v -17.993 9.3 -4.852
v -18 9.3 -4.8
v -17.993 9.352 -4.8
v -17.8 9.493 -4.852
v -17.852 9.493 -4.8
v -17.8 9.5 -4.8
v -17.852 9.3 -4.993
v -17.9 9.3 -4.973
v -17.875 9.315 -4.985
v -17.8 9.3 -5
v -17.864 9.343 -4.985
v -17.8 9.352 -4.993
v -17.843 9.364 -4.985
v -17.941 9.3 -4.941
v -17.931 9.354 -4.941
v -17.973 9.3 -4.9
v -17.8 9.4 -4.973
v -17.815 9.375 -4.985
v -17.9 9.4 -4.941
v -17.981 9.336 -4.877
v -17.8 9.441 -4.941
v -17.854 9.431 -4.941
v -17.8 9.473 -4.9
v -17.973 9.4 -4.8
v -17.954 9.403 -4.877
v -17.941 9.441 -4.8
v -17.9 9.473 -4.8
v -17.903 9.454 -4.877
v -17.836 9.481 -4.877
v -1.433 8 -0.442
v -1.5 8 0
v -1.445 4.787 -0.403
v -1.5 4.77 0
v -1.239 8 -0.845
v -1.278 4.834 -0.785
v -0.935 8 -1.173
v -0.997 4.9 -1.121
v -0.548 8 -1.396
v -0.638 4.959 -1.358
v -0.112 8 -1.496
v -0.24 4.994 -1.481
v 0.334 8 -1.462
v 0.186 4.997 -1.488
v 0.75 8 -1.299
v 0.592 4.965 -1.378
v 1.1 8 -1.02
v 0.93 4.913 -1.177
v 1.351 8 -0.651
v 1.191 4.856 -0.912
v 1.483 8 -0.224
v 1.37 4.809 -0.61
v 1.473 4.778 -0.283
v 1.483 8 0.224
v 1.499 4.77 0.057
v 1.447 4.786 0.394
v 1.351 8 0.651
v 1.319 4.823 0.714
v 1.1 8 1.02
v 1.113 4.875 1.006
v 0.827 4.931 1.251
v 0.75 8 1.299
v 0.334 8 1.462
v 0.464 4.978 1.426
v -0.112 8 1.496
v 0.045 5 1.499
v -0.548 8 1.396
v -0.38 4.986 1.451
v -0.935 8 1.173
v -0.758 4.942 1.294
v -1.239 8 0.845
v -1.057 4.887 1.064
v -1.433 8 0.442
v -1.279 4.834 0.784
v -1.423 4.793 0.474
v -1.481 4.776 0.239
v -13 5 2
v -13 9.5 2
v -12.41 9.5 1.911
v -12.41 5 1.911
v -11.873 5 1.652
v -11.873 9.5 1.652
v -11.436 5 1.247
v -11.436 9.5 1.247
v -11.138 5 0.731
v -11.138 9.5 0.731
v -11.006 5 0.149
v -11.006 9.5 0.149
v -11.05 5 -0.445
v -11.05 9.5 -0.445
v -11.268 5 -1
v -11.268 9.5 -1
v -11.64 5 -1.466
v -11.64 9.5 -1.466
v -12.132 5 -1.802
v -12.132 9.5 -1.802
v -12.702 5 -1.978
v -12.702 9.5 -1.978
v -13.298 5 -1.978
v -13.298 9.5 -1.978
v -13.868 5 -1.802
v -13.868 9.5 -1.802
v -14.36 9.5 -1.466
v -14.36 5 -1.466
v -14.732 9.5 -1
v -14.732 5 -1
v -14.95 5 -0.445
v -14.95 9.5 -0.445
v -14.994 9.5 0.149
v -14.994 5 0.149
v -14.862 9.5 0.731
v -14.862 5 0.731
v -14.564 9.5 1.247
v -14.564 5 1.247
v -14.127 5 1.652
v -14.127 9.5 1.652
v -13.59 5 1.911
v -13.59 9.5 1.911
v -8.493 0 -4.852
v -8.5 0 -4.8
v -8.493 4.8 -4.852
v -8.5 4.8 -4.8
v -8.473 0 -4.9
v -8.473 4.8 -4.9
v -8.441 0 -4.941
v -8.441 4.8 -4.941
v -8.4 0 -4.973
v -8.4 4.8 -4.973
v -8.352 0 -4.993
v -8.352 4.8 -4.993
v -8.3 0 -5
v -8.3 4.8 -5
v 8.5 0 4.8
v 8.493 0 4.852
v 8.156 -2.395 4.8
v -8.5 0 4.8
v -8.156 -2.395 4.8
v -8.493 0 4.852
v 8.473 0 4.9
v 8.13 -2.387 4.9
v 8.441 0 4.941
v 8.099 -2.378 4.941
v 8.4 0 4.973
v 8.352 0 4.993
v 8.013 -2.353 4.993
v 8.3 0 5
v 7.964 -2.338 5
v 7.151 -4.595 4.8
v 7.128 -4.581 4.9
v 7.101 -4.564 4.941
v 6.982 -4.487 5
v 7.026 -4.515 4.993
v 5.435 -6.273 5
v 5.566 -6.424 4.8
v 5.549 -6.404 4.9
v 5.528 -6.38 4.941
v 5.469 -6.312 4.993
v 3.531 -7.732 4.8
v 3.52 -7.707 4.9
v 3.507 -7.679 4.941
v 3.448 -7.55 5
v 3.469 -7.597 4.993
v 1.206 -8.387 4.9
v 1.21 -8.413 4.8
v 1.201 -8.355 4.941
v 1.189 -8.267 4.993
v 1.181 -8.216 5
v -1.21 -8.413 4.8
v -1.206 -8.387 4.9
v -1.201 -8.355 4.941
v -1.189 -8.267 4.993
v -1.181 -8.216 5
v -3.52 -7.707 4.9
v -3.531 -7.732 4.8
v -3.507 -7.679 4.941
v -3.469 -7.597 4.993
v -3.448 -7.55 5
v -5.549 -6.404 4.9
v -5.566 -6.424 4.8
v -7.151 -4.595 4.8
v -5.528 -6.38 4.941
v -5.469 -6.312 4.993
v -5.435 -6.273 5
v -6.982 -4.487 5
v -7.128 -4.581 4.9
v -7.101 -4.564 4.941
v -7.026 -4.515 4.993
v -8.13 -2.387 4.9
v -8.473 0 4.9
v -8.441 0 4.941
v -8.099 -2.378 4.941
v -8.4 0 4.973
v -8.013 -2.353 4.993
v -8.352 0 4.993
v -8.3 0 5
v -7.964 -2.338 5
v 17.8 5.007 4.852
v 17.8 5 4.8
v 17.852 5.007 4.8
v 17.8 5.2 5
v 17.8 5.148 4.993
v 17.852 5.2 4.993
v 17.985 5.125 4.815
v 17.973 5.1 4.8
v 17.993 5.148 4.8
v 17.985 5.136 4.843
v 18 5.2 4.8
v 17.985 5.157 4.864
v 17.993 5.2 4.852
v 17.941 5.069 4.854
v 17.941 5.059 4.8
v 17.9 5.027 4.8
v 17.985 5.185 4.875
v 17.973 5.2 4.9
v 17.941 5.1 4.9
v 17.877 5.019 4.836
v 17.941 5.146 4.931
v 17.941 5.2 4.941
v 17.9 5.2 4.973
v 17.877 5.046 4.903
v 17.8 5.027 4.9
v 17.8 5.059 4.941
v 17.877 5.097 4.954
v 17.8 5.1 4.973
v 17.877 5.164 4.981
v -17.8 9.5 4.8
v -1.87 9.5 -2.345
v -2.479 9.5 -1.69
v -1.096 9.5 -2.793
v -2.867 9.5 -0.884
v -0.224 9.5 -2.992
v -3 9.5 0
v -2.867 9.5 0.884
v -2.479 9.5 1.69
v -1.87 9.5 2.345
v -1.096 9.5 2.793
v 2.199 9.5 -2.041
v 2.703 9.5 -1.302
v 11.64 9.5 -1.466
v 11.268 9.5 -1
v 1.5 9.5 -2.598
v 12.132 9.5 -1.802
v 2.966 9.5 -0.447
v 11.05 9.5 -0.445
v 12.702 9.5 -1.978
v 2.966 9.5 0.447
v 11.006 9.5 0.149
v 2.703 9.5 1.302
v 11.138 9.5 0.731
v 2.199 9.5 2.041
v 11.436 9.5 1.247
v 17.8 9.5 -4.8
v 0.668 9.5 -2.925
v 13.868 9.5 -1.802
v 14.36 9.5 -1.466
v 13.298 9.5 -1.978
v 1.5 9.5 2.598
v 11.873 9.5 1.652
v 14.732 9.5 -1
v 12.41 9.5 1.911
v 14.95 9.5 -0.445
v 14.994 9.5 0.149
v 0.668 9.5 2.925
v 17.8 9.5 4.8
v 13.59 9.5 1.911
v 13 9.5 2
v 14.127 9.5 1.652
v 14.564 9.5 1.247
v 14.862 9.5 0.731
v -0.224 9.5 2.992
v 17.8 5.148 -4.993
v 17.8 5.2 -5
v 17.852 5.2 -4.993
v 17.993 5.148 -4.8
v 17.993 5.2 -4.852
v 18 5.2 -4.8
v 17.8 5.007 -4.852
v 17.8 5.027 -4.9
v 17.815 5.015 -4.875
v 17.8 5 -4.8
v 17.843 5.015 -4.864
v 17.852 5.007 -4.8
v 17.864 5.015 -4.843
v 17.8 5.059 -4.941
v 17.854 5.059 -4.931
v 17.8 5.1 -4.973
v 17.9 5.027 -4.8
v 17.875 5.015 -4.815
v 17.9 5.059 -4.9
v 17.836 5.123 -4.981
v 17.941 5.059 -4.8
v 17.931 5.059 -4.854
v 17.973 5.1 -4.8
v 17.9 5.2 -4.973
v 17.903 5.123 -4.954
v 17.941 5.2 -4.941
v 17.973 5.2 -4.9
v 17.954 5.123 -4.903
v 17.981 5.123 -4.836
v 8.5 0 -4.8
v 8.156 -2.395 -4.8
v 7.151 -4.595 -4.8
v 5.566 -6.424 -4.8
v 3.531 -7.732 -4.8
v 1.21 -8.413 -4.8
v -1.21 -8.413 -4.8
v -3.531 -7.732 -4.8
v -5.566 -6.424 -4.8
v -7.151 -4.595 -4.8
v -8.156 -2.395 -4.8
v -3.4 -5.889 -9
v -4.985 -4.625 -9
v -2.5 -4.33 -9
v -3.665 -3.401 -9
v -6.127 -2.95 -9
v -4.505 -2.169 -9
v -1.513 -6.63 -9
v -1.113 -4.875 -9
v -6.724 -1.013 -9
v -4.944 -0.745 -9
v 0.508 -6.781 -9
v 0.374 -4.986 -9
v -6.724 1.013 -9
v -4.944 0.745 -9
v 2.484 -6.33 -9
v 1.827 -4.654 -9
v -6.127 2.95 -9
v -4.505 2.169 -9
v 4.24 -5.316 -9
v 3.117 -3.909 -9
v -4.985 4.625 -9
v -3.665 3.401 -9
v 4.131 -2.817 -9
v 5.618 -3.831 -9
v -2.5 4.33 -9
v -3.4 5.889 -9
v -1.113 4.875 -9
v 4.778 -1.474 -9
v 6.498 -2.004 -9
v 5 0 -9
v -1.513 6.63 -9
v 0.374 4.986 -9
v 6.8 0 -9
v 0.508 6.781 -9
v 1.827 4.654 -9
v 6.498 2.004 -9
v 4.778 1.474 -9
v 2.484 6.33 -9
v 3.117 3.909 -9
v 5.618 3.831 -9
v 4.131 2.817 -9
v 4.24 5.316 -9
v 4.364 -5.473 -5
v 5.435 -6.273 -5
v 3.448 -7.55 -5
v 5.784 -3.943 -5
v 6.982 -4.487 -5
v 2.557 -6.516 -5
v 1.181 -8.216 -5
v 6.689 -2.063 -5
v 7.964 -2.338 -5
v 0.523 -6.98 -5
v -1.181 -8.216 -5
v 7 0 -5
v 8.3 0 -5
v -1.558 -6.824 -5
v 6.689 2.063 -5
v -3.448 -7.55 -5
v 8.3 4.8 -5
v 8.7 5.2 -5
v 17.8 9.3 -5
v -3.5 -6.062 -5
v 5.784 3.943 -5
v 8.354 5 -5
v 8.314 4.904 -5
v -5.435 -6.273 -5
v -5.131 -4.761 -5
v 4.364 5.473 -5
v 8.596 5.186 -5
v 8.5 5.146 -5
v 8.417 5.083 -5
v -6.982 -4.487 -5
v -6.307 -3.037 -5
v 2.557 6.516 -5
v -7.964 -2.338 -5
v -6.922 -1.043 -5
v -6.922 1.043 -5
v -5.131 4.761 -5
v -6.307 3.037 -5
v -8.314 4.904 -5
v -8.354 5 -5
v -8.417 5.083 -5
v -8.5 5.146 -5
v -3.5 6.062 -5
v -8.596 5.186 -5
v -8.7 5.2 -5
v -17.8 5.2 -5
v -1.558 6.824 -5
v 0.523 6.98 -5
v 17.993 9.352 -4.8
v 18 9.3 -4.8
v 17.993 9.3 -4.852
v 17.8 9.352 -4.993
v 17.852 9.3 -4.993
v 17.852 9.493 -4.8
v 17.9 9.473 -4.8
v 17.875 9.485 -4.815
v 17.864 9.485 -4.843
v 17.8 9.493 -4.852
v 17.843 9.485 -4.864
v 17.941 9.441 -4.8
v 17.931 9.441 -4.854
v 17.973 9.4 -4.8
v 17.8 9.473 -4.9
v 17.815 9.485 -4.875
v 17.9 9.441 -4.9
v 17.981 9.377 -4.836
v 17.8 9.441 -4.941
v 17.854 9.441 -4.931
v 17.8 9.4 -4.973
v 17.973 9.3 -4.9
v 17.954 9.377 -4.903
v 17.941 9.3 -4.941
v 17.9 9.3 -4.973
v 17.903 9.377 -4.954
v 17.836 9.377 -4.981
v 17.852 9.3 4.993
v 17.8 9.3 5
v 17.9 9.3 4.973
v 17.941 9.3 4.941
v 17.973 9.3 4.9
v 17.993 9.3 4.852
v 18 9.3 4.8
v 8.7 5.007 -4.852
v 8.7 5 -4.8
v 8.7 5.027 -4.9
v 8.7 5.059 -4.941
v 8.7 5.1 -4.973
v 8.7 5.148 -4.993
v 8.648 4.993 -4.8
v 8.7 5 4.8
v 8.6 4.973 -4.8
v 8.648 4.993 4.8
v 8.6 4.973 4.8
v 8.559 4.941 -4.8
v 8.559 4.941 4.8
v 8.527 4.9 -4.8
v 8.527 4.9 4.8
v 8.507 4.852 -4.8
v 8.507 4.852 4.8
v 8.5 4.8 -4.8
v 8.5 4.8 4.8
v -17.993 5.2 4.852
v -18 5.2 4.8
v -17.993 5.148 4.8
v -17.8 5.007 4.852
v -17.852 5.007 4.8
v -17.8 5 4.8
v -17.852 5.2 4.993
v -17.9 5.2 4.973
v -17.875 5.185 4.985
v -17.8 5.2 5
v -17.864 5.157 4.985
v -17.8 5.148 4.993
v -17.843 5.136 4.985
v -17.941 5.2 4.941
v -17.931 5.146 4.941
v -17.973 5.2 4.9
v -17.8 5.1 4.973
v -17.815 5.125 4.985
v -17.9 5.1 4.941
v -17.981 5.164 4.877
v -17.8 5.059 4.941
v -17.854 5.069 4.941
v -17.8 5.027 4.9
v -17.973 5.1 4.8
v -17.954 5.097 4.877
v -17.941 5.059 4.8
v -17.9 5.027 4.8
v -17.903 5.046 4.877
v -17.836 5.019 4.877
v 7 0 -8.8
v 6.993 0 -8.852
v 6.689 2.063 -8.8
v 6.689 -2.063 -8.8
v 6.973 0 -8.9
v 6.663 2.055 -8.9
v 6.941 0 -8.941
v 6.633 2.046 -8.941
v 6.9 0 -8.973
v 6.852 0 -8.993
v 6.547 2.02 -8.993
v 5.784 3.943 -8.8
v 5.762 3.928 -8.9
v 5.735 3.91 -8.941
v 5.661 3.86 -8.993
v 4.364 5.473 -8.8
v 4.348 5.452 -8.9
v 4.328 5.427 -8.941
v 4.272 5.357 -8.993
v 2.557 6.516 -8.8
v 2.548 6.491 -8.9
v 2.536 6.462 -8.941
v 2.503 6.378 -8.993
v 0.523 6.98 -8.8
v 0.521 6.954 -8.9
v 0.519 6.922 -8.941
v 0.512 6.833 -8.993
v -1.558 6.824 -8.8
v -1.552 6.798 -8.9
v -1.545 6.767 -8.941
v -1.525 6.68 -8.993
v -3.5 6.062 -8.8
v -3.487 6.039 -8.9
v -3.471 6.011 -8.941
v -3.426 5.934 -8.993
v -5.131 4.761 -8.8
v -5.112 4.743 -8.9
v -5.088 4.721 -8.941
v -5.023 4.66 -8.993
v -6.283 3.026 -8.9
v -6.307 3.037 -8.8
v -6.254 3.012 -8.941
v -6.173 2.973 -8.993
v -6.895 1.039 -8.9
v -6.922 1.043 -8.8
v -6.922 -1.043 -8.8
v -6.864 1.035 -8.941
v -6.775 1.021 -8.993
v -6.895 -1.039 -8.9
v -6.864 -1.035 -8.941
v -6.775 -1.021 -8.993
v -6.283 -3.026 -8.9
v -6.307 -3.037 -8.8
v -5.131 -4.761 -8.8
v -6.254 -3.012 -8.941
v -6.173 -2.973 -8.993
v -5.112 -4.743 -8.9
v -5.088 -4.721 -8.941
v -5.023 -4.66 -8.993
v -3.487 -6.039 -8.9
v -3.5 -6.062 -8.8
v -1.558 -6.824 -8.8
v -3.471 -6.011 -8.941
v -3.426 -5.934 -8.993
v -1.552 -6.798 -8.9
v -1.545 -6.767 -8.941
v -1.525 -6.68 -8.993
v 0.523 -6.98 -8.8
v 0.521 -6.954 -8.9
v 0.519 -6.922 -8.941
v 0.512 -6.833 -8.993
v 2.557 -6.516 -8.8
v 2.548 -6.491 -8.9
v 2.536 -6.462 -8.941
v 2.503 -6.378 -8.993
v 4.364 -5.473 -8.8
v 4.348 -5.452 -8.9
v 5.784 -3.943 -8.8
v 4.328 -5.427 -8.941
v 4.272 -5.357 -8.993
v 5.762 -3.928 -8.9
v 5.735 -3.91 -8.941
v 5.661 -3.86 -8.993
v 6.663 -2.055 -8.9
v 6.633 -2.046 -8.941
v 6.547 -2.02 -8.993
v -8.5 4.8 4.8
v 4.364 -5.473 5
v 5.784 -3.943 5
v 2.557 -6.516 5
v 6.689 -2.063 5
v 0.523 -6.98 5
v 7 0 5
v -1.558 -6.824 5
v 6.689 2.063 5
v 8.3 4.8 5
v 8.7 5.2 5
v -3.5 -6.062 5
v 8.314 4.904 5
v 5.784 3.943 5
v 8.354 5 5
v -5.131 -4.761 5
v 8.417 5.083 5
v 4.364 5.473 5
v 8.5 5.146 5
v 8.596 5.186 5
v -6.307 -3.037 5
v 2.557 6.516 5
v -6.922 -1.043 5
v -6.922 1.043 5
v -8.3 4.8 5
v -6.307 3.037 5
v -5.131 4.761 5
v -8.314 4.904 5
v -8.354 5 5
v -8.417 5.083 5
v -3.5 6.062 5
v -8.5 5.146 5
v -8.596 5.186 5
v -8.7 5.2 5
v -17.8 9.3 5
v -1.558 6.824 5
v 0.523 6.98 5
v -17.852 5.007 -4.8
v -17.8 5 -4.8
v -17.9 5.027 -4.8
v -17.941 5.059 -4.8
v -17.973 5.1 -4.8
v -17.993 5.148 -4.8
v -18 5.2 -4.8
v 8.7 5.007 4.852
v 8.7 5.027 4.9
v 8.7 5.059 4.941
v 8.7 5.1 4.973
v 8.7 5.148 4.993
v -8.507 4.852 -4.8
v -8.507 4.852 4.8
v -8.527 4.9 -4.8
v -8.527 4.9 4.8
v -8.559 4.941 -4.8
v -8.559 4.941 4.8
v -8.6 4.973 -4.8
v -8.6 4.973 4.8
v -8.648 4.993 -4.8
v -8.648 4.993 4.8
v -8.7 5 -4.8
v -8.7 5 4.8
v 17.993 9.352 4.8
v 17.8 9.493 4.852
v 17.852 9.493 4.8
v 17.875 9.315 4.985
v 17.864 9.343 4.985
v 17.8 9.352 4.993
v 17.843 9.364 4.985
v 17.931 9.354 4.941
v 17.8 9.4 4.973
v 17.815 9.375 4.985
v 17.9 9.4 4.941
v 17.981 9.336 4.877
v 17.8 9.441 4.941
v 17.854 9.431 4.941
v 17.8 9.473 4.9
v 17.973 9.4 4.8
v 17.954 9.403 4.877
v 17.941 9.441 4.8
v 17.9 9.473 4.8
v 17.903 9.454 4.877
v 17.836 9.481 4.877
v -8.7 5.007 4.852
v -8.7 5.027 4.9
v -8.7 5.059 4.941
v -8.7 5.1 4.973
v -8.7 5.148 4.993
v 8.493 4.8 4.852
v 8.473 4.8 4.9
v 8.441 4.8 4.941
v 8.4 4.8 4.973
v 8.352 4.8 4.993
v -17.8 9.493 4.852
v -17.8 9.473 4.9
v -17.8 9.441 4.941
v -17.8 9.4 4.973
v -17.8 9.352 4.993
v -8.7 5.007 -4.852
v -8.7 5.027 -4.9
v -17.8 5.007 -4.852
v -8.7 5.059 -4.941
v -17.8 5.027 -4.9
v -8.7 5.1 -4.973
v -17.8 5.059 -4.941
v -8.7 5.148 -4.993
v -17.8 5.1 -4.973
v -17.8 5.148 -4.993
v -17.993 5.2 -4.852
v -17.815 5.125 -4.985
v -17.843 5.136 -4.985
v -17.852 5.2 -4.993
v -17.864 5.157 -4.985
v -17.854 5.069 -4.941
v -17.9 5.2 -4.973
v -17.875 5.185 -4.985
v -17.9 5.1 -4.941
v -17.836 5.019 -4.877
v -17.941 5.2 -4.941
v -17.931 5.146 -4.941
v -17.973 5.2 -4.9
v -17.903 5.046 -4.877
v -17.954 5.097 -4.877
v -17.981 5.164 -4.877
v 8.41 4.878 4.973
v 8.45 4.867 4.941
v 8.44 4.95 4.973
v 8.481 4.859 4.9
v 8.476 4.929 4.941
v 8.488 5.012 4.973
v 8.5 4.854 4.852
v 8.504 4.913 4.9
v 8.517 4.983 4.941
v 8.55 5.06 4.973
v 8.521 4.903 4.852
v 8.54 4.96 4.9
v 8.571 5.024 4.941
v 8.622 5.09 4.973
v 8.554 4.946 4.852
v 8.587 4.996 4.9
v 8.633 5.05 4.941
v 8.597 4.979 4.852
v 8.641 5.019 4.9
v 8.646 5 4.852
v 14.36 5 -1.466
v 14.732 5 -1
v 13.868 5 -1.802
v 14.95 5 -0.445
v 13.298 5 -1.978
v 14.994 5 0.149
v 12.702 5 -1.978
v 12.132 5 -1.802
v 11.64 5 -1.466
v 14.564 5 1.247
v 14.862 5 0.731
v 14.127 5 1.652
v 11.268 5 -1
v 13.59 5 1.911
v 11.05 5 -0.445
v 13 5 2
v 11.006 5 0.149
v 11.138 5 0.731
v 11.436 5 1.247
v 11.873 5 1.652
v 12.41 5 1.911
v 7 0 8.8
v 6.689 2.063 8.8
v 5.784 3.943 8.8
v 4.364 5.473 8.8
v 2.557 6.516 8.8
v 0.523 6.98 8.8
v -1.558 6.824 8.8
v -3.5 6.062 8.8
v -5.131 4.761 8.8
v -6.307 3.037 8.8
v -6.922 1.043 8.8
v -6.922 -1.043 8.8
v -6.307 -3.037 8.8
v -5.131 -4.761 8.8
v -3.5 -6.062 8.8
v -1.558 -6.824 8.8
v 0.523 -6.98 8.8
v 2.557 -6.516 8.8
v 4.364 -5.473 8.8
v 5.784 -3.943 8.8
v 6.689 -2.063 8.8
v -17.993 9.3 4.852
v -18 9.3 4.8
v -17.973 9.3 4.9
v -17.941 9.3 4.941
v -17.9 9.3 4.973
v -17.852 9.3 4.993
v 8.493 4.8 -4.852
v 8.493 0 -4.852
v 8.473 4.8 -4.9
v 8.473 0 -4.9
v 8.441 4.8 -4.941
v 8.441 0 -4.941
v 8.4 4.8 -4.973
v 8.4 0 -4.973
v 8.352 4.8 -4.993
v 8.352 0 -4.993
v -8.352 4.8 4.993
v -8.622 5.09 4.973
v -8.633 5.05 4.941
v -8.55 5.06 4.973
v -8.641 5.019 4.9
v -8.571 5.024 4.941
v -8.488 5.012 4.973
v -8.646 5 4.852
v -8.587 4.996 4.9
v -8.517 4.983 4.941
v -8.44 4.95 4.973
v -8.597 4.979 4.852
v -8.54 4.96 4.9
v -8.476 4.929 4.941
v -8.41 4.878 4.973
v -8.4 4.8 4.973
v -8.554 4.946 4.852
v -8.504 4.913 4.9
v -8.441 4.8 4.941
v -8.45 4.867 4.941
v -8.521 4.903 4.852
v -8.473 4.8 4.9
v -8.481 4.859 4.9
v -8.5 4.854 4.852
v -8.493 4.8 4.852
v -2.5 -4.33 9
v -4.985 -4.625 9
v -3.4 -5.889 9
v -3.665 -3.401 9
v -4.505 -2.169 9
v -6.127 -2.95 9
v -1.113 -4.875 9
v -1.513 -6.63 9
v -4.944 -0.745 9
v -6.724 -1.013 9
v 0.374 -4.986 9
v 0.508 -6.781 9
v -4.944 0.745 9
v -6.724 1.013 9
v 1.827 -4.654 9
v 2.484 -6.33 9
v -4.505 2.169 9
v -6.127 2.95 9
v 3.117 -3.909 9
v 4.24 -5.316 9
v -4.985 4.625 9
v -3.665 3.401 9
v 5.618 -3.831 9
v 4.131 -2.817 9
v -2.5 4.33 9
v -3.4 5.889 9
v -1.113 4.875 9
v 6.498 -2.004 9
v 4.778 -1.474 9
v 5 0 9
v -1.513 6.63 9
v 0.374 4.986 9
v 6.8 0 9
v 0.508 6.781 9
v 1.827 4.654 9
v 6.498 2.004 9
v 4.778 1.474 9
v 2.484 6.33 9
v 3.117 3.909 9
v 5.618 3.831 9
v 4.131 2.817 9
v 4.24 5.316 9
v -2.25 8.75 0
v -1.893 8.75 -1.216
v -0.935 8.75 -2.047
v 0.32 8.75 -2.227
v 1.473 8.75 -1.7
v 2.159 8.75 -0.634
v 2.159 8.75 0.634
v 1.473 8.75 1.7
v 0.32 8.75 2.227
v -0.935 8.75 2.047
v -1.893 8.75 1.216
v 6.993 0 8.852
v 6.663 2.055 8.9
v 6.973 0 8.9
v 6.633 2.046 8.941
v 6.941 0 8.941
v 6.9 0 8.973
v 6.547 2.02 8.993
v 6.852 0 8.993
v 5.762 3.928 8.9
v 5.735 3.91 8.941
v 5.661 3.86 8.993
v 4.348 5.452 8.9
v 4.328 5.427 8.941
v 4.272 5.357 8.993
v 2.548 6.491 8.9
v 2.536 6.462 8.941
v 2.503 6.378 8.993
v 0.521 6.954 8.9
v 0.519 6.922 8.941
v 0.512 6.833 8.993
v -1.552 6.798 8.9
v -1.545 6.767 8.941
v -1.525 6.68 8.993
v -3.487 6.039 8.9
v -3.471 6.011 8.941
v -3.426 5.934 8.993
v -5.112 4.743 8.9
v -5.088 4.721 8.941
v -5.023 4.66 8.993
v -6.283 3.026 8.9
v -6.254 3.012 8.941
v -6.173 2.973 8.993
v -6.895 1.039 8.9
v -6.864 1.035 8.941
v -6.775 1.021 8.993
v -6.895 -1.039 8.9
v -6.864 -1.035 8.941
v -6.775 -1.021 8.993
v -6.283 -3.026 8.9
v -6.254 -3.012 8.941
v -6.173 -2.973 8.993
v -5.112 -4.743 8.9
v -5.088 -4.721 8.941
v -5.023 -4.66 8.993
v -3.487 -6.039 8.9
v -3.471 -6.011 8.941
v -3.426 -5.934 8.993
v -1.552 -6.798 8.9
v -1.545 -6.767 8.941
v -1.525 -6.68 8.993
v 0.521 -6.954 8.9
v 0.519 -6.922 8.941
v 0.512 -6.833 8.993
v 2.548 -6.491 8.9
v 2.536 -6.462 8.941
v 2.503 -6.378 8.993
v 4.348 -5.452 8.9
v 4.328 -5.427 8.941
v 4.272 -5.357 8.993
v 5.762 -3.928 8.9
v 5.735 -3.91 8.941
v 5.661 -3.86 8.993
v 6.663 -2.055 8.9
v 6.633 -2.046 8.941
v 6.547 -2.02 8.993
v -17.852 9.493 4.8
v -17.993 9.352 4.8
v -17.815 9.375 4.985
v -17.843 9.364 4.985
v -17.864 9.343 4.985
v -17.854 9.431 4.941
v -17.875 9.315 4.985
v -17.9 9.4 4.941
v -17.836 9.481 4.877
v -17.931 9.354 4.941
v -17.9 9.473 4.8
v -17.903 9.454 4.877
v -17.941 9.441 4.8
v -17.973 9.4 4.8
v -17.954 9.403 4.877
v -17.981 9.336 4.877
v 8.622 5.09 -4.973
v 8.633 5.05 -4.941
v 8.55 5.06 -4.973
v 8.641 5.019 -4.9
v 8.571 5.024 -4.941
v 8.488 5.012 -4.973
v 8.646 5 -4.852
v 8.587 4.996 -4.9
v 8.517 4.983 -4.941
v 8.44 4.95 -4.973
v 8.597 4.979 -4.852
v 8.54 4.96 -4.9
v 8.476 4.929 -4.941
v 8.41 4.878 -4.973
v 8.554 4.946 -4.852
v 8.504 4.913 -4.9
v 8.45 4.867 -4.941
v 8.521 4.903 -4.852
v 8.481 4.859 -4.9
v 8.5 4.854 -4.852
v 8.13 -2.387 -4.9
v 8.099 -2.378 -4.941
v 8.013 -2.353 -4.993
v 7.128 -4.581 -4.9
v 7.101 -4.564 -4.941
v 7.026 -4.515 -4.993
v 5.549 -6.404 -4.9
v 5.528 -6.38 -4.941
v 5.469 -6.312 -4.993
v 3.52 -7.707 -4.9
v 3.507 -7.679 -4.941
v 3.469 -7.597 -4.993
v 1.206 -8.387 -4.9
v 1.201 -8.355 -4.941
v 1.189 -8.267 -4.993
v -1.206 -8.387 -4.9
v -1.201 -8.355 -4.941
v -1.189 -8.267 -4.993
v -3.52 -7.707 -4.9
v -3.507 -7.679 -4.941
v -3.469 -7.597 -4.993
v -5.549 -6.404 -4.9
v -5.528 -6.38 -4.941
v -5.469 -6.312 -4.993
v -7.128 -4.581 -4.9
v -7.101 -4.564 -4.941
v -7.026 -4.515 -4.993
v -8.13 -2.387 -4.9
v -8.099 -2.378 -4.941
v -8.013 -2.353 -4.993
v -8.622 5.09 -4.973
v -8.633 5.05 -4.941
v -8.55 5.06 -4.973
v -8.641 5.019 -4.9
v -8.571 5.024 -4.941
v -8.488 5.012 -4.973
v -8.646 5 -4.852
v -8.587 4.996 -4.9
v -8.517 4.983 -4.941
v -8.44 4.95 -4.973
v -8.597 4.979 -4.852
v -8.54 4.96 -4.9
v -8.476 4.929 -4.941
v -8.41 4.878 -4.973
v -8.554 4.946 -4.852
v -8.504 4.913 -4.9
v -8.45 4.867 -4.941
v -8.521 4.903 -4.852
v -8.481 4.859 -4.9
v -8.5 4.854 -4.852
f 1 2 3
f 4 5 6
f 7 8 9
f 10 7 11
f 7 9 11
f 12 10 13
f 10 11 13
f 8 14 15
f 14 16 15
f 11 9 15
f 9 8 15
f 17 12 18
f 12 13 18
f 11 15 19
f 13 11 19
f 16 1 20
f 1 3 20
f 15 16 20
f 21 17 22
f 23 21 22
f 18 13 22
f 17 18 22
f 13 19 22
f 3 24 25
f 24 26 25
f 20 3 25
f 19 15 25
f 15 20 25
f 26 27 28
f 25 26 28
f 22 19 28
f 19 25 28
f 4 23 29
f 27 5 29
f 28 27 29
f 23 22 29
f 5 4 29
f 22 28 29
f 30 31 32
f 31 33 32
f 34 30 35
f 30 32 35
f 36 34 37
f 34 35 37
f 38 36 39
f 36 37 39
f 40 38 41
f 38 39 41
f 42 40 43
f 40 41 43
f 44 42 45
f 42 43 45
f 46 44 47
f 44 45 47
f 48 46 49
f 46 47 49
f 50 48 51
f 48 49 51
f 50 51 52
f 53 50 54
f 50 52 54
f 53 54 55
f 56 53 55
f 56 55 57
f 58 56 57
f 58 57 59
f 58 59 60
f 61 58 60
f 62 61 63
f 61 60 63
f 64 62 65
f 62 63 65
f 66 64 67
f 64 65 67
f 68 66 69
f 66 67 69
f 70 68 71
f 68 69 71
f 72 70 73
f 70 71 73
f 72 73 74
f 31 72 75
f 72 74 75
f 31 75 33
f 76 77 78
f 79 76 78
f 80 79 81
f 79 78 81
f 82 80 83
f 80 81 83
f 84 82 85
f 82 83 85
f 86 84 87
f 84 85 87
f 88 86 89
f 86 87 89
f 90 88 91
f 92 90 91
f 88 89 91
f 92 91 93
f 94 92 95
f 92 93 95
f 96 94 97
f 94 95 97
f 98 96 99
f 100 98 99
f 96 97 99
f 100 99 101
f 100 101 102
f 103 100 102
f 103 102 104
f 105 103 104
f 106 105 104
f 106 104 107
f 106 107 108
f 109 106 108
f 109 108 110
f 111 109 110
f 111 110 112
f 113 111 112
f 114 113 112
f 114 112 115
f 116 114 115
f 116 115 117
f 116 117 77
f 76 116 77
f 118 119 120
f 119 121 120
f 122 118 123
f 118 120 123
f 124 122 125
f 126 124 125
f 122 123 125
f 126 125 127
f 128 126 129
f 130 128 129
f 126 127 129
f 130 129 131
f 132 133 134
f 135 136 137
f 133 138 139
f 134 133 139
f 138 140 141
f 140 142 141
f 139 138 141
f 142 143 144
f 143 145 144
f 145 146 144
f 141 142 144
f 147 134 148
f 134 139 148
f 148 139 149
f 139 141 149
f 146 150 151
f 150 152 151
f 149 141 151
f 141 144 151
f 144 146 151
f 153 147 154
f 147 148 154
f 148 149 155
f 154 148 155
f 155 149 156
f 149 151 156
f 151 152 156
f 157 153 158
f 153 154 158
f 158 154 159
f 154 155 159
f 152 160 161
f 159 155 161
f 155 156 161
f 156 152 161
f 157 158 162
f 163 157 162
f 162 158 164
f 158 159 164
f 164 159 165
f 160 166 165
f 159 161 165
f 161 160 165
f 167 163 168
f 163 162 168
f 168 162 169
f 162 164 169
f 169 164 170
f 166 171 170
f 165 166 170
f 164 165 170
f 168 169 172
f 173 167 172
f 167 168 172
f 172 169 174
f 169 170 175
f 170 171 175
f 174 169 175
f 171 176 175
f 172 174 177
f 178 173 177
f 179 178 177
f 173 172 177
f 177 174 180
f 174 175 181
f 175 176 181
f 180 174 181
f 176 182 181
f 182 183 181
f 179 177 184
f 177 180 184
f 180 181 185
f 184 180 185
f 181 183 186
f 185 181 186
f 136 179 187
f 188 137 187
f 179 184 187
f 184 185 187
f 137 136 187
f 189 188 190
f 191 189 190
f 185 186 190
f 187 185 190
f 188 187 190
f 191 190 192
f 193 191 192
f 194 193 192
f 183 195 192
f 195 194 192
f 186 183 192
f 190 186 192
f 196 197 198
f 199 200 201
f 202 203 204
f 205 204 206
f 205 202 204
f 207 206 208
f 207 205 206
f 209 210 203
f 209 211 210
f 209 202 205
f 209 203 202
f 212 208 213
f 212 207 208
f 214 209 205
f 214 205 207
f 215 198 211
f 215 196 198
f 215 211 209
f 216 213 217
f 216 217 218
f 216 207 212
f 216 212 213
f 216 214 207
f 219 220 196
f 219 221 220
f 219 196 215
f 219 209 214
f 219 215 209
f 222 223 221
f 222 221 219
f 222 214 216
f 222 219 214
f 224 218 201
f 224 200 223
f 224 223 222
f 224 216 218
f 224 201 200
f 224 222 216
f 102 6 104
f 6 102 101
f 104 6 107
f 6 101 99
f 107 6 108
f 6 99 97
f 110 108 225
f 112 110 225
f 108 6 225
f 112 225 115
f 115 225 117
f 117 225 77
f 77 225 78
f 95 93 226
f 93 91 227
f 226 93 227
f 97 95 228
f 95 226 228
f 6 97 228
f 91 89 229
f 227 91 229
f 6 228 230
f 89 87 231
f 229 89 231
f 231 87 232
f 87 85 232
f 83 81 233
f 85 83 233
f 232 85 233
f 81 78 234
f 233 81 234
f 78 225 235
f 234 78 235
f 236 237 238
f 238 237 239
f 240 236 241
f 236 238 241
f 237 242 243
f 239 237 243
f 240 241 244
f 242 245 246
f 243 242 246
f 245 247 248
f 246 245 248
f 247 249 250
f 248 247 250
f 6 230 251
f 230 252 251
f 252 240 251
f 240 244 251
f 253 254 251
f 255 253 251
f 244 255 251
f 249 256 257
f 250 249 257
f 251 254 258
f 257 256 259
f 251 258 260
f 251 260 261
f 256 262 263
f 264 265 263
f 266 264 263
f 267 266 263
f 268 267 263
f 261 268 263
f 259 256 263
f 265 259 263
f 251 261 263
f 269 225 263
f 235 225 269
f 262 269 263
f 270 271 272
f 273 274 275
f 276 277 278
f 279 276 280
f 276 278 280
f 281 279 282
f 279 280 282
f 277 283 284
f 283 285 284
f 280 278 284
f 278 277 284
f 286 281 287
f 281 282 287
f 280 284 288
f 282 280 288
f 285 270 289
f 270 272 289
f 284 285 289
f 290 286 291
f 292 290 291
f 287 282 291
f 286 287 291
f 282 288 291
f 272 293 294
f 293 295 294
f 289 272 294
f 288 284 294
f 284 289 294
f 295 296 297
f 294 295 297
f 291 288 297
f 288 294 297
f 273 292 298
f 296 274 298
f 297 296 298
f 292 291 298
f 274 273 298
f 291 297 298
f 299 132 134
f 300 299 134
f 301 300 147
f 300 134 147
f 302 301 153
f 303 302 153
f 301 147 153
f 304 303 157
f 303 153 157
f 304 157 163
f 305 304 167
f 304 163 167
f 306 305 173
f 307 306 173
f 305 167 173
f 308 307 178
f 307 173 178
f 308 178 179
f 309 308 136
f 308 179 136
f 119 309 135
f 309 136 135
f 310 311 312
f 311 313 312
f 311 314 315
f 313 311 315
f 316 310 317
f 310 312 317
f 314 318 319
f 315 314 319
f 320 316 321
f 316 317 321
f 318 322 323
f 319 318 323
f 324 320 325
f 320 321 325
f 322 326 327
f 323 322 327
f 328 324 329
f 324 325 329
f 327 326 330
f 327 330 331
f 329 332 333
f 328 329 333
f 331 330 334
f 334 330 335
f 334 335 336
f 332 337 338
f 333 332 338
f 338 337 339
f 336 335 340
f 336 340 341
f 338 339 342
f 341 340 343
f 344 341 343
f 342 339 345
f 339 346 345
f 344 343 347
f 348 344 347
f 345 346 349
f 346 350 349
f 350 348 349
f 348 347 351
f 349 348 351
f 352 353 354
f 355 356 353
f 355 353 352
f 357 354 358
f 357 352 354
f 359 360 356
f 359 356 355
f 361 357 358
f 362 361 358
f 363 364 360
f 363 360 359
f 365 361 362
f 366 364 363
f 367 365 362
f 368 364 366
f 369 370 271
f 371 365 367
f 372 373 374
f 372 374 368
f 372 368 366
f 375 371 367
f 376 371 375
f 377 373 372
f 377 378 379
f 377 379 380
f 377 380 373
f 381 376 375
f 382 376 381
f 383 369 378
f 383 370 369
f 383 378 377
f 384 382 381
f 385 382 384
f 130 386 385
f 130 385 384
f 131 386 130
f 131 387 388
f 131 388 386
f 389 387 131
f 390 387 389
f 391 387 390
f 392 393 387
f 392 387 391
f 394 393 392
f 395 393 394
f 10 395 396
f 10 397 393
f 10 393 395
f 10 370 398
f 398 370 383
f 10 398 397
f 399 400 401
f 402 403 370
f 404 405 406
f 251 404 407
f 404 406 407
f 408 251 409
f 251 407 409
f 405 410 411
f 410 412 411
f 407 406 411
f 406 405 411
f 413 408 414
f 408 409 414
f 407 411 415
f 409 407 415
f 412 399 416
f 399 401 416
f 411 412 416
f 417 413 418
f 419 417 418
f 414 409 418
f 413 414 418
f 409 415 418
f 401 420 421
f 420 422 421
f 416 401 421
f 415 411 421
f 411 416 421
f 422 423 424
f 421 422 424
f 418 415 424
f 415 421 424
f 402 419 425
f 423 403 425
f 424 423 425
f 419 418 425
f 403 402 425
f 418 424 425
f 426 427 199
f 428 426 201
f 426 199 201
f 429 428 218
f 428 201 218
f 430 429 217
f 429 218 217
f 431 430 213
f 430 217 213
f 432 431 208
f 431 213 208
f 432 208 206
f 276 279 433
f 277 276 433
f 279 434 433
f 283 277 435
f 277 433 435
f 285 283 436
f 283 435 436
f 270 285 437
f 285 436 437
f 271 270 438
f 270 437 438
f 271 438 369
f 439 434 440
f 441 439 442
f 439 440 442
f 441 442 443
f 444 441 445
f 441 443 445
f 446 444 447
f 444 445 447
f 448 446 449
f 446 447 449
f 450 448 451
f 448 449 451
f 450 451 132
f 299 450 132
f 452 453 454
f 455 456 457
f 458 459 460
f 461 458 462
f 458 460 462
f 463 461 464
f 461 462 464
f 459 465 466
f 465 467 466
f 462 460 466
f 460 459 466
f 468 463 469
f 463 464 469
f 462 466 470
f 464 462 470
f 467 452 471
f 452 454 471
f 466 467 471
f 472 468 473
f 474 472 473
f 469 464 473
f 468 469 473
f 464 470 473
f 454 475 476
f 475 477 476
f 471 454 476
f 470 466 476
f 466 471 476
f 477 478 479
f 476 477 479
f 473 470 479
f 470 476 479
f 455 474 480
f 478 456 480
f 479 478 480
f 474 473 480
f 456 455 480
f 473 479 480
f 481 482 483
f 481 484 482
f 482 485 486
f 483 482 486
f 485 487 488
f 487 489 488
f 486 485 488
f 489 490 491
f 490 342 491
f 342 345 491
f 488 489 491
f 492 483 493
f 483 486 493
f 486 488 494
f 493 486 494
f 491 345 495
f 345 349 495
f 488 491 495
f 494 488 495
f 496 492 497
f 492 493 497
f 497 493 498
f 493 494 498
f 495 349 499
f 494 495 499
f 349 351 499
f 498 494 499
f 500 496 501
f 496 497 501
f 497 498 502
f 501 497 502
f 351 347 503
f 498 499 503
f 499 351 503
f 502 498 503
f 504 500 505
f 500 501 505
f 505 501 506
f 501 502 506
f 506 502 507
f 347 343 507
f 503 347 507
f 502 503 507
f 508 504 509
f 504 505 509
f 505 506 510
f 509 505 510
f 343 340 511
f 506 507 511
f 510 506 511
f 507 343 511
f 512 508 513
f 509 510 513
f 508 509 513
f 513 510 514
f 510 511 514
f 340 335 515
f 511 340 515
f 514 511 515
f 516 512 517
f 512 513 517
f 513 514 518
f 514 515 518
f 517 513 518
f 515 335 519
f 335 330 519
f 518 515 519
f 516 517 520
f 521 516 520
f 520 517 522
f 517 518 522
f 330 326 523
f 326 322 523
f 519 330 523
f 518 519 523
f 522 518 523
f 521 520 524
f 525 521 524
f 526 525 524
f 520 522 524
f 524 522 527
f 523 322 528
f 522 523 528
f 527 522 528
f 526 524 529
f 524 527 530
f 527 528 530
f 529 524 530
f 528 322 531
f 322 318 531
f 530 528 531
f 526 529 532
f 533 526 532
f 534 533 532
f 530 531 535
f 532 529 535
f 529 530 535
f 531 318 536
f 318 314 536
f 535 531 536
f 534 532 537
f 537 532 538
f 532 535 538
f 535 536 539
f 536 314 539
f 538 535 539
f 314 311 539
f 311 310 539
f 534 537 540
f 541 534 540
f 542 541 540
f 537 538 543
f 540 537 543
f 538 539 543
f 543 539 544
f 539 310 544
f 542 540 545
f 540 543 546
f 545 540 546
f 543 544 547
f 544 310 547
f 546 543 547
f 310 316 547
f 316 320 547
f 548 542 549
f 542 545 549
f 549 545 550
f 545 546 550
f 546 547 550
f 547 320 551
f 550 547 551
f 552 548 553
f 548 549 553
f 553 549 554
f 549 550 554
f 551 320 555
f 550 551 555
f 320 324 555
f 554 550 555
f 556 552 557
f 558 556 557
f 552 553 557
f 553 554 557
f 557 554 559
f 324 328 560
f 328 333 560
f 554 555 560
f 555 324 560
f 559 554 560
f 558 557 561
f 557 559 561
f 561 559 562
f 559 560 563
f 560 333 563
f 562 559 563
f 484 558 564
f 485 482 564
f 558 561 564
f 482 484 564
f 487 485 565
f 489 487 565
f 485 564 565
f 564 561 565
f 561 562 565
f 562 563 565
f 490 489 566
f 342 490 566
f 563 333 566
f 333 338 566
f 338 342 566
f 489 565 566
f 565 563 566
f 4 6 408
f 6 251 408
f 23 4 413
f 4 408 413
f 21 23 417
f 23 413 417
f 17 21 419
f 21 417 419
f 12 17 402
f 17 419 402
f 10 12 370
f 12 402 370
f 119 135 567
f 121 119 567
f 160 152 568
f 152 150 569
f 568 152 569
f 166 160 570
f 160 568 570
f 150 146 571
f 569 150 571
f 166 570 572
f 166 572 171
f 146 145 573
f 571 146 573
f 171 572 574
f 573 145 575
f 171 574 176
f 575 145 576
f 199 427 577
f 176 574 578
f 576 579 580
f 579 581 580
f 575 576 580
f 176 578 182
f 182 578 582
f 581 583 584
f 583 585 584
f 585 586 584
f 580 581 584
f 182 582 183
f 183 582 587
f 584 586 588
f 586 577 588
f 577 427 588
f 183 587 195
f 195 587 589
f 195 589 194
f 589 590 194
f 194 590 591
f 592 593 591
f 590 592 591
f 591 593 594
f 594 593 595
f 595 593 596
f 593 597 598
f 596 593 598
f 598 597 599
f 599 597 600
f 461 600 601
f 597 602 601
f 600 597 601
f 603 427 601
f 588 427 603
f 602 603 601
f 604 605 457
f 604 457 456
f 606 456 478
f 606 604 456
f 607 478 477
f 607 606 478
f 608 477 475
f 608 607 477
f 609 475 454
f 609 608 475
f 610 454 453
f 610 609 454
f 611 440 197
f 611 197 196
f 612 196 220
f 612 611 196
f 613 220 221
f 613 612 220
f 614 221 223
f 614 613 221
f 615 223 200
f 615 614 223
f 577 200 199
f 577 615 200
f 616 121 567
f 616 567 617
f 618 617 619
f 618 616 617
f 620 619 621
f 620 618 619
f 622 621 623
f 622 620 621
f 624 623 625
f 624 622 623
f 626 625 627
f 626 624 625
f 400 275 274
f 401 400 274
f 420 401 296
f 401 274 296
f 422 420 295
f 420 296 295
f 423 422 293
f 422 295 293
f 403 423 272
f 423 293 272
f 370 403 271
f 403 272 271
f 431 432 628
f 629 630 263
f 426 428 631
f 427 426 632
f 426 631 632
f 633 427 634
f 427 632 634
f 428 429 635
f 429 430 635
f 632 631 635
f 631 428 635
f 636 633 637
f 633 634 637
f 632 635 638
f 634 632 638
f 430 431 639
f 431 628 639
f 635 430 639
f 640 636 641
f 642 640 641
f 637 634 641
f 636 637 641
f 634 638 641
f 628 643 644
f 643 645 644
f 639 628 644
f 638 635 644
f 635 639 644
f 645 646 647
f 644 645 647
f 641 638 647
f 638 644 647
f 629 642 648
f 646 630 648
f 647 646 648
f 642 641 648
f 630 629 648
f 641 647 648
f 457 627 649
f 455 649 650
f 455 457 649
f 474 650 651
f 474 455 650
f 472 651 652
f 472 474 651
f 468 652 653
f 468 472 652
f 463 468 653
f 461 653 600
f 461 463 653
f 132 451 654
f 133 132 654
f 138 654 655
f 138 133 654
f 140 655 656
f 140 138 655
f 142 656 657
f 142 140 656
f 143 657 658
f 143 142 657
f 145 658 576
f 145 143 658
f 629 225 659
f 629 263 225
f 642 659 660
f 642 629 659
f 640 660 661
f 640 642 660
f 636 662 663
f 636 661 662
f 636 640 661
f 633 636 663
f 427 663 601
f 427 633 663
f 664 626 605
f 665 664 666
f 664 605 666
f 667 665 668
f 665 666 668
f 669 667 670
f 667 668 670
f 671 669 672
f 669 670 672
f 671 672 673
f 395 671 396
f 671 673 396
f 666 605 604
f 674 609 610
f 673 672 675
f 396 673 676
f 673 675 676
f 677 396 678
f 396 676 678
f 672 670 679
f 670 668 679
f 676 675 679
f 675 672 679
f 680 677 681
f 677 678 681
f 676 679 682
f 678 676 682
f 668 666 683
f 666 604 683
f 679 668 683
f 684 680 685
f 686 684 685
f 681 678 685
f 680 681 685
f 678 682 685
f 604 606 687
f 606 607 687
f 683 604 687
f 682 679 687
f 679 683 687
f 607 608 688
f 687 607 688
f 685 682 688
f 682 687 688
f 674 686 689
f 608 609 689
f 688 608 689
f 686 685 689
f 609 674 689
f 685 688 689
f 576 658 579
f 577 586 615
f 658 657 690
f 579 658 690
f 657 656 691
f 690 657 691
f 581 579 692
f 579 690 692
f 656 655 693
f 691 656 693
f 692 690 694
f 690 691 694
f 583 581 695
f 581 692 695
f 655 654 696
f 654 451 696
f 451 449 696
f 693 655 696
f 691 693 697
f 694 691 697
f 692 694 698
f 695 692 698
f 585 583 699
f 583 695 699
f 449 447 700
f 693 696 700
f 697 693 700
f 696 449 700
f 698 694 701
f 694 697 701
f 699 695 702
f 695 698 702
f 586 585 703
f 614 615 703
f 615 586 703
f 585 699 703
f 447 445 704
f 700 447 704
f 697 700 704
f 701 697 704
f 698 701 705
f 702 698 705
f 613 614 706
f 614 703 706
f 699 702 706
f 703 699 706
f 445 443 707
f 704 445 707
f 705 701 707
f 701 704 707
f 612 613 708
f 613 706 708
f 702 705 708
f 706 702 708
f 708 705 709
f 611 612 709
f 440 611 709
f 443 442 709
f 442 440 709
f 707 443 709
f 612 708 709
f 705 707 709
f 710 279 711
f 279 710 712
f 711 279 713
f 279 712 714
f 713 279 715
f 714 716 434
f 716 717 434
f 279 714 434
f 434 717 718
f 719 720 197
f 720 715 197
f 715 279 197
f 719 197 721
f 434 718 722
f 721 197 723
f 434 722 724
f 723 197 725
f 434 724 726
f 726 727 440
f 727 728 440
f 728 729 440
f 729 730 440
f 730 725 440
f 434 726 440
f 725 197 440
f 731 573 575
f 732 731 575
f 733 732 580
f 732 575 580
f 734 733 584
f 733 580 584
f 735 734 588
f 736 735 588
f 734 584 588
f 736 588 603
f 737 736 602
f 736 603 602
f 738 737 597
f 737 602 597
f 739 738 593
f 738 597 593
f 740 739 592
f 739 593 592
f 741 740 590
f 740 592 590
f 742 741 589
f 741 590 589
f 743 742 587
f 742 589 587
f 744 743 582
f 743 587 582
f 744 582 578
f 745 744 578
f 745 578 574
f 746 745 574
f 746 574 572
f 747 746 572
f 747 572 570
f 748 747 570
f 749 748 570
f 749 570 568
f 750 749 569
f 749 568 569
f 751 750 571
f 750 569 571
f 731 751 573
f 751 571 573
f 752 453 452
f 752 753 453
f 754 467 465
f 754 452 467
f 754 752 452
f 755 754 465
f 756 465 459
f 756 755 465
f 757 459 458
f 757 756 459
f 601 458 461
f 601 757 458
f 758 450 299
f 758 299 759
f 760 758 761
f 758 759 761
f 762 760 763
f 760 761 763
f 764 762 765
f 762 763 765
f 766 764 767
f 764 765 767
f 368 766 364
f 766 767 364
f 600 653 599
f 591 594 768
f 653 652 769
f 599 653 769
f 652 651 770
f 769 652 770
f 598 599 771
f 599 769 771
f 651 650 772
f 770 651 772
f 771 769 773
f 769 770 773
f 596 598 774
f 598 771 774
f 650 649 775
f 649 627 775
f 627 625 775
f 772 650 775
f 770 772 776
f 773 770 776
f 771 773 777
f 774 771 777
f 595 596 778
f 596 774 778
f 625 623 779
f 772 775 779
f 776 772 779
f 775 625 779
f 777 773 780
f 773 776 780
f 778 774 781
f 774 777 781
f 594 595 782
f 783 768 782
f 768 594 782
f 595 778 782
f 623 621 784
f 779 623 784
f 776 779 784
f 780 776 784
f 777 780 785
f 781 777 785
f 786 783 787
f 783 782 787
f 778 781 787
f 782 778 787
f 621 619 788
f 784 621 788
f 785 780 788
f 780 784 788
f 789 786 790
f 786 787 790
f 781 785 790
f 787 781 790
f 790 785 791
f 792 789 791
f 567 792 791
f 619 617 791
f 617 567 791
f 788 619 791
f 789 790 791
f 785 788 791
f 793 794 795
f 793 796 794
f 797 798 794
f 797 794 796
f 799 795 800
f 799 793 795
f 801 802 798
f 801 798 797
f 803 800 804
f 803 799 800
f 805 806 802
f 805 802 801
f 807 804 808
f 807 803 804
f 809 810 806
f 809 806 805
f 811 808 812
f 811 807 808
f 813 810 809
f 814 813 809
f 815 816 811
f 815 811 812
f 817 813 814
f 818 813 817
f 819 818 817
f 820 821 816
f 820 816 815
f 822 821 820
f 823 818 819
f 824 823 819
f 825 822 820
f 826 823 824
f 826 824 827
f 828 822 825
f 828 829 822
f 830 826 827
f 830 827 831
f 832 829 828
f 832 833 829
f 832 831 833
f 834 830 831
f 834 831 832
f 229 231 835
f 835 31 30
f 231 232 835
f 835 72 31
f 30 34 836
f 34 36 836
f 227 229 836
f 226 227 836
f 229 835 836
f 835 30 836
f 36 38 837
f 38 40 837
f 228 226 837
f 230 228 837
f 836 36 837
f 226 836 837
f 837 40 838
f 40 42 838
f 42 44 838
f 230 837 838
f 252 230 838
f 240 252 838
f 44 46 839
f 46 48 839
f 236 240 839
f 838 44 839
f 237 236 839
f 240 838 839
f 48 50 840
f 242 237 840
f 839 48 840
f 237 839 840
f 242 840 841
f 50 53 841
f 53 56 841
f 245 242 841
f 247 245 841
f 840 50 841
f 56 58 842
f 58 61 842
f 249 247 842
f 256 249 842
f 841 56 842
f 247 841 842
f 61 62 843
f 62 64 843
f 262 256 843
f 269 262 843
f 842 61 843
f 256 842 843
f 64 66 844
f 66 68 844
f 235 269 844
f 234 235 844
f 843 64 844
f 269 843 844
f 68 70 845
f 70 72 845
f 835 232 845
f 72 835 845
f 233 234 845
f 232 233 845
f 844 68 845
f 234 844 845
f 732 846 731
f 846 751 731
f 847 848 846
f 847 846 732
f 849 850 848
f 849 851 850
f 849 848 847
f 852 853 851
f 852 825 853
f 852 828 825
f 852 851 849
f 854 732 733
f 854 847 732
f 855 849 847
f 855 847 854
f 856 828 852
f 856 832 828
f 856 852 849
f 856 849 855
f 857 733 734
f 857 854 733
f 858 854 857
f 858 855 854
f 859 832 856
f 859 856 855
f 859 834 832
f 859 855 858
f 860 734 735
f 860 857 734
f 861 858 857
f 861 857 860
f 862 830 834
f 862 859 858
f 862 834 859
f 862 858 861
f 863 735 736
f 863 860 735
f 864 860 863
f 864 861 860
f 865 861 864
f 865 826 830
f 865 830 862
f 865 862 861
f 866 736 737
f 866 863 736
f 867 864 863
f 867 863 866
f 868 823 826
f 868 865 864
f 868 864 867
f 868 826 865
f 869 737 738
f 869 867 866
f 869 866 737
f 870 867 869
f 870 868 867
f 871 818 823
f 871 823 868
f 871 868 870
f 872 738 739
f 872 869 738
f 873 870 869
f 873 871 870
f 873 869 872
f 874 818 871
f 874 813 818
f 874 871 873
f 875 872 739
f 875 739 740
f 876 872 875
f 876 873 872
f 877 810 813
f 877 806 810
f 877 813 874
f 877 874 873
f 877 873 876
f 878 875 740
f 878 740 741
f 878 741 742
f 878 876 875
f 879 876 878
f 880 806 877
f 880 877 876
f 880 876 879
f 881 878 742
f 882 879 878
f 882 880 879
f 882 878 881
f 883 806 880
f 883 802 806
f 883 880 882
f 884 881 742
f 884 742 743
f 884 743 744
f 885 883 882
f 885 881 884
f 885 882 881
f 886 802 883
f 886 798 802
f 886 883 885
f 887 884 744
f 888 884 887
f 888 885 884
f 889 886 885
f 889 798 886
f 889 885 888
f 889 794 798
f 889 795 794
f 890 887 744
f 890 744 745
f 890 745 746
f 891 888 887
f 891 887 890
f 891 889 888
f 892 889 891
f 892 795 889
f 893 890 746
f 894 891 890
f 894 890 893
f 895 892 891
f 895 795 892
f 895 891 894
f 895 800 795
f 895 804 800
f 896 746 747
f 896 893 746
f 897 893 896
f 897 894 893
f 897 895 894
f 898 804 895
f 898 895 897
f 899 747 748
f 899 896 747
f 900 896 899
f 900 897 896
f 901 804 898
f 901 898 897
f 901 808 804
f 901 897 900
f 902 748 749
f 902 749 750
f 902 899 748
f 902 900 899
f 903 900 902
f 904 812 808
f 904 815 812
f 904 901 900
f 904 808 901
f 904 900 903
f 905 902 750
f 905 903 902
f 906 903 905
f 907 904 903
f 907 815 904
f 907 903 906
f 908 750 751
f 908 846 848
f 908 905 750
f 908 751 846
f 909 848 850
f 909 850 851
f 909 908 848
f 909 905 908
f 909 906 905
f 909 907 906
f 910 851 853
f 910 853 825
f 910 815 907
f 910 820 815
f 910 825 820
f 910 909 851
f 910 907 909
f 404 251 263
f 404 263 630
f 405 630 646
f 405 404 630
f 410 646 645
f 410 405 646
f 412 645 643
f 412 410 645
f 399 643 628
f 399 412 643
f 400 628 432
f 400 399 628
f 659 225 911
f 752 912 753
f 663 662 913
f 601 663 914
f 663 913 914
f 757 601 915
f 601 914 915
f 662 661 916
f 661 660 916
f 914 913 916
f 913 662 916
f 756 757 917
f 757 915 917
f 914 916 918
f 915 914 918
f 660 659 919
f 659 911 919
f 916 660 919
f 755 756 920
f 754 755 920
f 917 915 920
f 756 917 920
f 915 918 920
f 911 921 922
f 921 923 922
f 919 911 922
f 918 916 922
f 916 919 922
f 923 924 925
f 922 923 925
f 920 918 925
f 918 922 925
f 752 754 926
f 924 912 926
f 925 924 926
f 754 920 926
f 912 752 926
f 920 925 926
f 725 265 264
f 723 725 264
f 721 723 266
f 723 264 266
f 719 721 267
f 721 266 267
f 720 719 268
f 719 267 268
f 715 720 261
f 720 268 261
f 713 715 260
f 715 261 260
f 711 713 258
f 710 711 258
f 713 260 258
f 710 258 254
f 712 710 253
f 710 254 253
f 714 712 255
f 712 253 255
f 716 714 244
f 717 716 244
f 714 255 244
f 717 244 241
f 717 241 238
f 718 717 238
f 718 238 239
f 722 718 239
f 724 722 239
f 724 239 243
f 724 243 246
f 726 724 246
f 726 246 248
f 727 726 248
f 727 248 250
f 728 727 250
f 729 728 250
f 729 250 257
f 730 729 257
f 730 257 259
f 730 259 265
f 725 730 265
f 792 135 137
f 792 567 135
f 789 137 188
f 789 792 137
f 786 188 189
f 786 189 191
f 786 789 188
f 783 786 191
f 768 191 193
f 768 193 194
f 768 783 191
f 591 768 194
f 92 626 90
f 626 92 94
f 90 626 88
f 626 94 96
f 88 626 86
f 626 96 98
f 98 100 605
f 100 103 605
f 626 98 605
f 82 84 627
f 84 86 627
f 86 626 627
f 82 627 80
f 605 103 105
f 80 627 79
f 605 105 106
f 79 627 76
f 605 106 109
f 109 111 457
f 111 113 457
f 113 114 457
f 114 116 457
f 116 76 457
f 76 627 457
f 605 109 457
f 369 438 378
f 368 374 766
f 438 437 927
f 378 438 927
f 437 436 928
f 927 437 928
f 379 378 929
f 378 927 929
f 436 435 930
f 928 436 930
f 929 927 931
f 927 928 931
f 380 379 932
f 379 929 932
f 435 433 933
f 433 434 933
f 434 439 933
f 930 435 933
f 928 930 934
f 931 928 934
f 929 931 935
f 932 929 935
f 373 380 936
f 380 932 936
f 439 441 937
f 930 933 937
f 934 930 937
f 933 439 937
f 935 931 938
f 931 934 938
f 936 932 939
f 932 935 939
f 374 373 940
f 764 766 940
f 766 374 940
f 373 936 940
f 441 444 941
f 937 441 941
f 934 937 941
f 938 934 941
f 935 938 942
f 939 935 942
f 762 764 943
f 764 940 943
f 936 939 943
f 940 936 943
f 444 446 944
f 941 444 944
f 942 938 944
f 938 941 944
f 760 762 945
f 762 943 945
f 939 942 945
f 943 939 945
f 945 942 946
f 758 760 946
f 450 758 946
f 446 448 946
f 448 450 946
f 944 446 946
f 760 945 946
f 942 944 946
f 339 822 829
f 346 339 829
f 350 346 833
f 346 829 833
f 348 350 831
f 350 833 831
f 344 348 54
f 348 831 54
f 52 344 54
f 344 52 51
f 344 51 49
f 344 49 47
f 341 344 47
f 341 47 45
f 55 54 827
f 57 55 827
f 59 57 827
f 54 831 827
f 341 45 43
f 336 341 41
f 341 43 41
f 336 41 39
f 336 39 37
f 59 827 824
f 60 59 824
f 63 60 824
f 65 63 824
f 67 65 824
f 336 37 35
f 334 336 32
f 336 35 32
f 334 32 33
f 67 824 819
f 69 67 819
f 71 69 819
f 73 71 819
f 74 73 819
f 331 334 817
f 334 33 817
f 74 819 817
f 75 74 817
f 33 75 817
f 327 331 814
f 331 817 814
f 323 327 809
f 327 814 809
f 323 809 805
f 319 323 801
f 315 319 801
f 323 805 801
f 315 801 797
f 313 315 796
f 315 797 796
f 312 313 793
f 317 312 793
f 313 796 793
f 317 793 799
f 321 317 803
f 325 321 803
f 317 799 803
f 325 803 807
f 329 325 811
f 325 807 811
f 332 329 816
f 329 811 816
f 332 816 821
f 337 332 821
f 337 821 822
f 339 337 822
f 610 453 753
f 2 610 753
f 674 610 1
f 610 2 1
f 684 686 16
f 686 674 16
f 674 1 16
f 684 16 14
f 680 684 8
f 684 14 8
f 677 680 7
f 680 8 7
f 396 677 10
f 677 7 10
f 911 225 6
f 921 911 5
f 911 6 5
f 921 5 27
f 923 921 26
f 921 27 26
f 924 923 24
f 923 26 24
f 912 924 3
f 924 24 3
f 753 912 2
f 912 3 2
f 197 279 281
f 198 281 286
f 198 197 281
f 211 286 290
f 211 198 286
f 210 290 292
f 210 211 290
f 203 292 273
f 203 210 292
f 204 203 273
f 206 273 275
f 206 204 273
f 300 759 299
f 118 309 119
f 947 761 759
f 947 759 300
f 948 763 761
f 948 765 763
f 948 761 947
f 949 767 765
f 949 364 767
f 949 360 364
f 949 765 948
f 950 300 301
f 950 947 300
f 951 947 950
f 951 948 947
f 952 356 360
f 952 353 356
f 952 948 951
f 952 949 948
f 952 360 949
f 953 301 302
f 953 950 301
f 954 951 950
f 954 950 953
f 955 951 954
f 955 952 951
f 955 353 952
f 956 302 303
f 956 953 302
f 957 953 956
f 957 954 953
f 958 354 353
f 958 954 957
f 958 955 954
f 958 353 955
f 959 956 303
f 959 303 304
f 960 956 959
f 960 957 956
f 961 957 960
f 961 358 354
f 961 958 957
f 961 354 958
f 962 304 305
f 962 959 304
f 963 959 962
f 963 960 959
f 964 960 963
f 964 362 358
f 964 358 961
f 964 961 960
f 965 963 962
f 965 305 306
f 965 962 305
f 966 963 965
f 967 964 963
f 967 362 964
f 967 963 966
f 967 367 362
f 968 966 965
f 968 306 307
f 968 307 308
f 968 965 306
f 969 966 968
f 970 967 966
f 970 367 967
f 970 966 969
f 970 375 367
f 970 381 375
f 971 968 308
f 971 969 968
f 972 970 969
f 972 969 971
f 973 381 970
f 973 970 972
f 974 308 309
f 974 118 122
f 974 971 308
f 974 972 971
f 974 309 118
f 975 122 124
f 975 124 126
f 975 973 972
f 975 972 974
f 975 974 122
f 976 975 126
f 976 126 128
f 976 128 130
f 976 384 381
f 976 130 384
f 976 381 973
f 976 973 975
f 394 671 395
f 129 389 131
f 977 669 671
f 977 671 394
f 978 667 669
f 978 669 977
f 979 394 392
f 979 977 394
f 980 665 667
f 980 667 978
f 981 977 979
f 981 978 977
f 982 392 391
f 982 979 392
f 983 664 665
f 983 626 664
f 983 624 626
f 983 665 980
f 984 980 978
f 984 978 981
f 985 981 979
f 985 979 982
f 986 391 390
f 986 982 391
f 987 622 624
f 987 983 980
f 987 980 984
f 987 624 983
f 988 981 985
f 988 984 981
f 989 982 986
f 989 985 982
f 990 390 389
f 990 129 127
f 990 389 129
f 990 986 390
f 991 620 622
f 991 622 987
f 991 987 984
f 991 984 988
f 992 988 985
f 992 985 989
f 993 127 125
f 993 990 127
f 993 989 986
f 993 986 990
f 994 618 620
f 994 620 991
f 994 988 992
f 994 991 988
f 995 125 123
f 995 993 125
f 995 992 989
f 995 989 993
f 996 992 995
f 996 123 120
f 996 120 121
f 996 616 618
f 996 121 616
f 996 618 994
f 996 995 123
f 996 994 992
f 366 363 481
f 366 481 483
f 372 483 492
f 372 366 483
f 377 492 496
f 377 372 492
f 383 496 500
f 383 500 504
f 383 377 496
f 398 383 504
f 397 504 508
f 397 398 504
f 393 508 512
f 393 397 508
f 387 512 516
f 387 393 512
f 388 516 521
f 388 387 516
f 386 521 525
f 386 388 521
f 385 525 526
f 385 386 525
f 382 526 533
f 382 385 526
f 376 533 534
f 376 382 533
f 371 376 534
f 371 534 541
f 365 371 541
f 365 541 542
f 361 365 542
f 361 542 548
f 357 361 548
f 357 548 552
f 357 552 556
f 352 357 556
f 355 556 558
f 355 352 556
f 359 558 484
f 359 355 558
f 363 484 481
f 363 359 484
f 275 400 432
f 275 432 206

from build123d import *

# Parameters (mm, degrees)
SKETCH1_R                                       = 5
BOSS_EXTRUDE1_DEPTH                             = 5
SKETCH2_R                                       = 7
BOSS_EXTRUDE2_DEPTH                             = 4
CUT_EXTRUDE1_START                              = -4
SKETCH3_R                                       = 5
CUT_EXTRUDE1_DEPTH                              = 4
SKETCH5_R                                       = 2
CUT_EXTRUDE2_DEPTH                              = 28
CSK_FOR_M3_FLAT_HEAD_MACHINE_SCREW1_D           = 3
CSK_FOR_M3_FLAT_HEAD_MACHINE_SCREW1_DEPTH       = 8.098709071
CSK_FOR_M3_FLAT_HEAD_MACHINE_SCREW1_CSINK_D     = 6
CSK_FOR_M3_FLAT_HEAD_MACHINE_SCREW1_CSINK_ANGLE = 90
CSK_FOR_M3_FLAT_HEAD_MACHINE_SCREW1_TIP         = 0.901290929
FILLET1_R                                       = 0.2


with BuildPart() as part:
    # Sketch1 → Boss-Extrude1 (new, symmetric)
    with BuildSketch(Plane.XY):
        with BuildLine():
            Line((-8.5, 0), (-8.5, 5))
            Line((-8.5, 5), (-18, 5))
            Line((-18, 5), (-18, 9.5))
            Line((-18, 9.5), (18, 9.5))
            Line((18, 9.5), (18, 5))
            Line((18, 5), (8.5, 5))
            Line((8.5, 5), (8.5, 0))
            ThreePointArc((8.5, 0), (0, -8.5), (-8.5, 0))
        make_face()
        Circle(SKETCH1_R, mode=Mode.SUBTRACT)
    extrude(amount=BOSS_EXTRUDE1_DEPTH, both=True)

    # Sketch2 → Boss-Extrude2 (add)
    with BuildSketch(Plane.XY.offset(5)):
        Circle(SKETCH2_R)
    boss_extrude2 = extrude(amount=BOSS_EXTRUDE2_DEPTH)

    # Sketch3 → Cut-Extrude1 (cut)
    with BuildSketch(Plane.XY.offset(9).offset(CUT_EXTRUDE1_START)):
        Circle(SKETCH3_R)
    cut_extrude1 = extrude(amount=CUT_EXTRUDE1_DEPTH, mode=Mode.SUBTRACT)

    # Mirror1: Boss-Extrude2, Cut-Extrude1 across plane
    add(boss_extrude2.mirror(Plane.XY))
    add(cut_extrude1.mirror(Plane.XY), mode=Mode.SUBTRACT)

    # Sketch5 → Cut-Extrude2 (cut, through all)
    with BuildSketch(Plane(origin=(0, 9.5, 0), x_dir=(1, 0, 0), z_dir=(0, 1, 0))):
        with Locations(Location((-13, 0, 0), (0, 0, 270))):
            Circle(SKETCH5_R)
        with Locations(Location((13, 0, 0), (0, 0, 270))):
            Circle(SKETCH5_R)
    extrude(amount=-CUT_EXTRUDE2_DEPTH, mode=Mode.SUBTRACT)

    # CSK for M3 Flat Head Machine Screw1
    with Locations(Plane(origin=(0, 9.5, 0), x_dir=(1, 0, 0), z_dir=(0, 1, 0))):
        with Locations((0, 0)):
            CounterSinkHole(CSK_FOR_M3_FLAT_HEAD_MACHINE_SCREW1_D / 2, CSK_FOR_M3_FLAT_HEAD_MACHINE_SCREW1_CSINK_D / 2, depth=CSK_FOR_M3_FLAT_HEAD_MACHINE_SCREW1_DEPTH, counter_sink_angle=CSK_FOR_M3_FLAT_HEAD_MACHINE_SCREW1_CSINK_ANGLE)
            with Locations((0, 0, -(CSK_FOR_M3_FLAT_HEAD_MACHINE_SCREW1_DEPTH + CSK_FOR_M3_FLAT_HEAD_MACHINE_SCREW1_TIP / 2))):  # 118° drill point
                Cone(0, CSK_FOR_M3_FLAT_HEAD_MACHINE_SCREW1_D / 2, CSK_FOR_M3_FLAT_HEAD_MACHINE_SCREW1_TIP, mode=Mode.SUBTRACT)

    # Fillet1
    fillet1_edges = [part.edges().sort_by_distance(p)[0] for p in [
        (18, 7.25, -5),
        (13.25, 5, -5),
        (8.5, 2.5, -5),
        (0, -8.5, -5),
        (13.25, 5, 5),
        (-8.5, 5, 0),
        (-18, 5, 0),
        (-18, 9.5, 0),
        (18, 9.5, 0),
        (18, 5, 0),
        (8.5, 5, 0),
        (18, 7.25, 5),
        (0, 9.5, 5),
        (-18, 7.25, 5),
        (-13.25, 5, 5),
        (-7, 0, 9),
        (-8.5, 2.5, 5),
        (-7, 0, -9),
        (0, -8.5, 5),
        (-8.5, 2.5, -5),
        (8.5, 2.5, 5),
        (-13.25, 5, -5),
        (-18, 7.25, -5),
        (0, 9.5, -5),
    ]]
    fillet(fillet1_edges, radius=FILLET1_R)


solid = part.part
